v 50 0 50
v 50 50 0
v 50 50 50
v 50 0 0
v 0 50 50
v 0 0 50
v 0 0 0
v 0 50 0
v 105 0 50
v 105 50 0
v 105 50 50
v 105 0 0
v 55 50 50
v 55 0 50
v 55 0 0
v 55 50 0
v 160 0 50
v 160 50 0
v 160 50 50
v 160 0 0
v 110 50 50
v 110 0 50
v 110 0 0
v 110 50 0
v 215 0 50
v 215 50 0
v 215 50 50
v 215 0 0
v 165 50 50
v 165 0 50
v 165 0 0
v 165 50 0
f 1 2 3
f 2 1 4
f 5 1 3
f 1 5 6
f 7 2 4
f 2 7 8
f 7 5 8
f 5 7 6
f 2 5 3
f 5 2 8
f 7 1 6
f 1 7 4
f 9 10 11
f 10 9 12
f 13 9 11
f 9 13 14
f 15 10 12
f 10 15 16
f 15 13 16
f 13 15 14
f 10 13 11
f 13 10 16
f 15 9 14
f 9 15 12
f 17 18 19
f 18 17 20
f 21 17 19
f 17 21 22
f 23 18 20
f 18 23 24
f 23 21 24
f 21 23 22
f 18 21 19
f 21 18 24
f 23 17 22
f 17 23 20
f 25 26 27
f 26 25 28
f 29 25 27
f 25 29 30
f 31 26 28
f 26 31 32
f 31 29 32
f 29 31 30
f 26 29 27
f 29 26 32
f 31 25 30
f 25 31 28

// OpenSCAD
 images = ["white.png", "white_flopped.png", "black.png", "black_flopped.png"];

imageScale = 0.9; // Edit this to make the character larger or smaller.

imageSize = 50;

spacingBetweenCubes = (imageSize/10);

numRows = len(images);

e = 0.1;
 

imageImpressionDepth = 1;
imageImpressionScale = imageImpressionDepth/100; // Calculated from surface scaling range (0 to 100)
margin = (imageSize - (imageSize * imageScale))/2;
centerImageOnCube = [margin, margin, imageImpressionDepth-e];
//centerImageOnCube = [margin, margin, -e];
uncenterImage = [imageSize/2, imageSize/2, imageImpressionDepth/2];

for ( i = [0 : numRows-1])
{
    translate([((imageSize*i) + (spacingBetweenCubes*i)), 0, 0]) {
        if( true )
        {
            difference() {
                cube(imageSize);
                translate(centerImageOnCube)
                scale([imageScale, imageScale, imageImpressionScale])
                surface(file = images[i]);
            }
        }
    }
}

//module cubes (images, imageSize, imageScale, spacingBetweenCubes)
//{
//    imageImpressionDepth = 1;
//    imageImpressionScale = imageImpressionDepth/100; // Calculated from surface scaling range (0 to 100)
//    margin = (imageSize - (imageSize * imageScale))/2;
//    centerImageOnCube = [margin, margin, imageImpressionDepth-e];
//    //centerImageOnCube = [margin, margin, -e];
//    uncenterImage = [imageSize/2, imageSize/2, imageImpressionDepth/2];
//    
////    i = 0;
////    j=0;
////                    difference() {
////                       cube(imageSize);
////                       translate(centerImageOnCube)
////                        scale([imageScale, imageScale, imageImpressionScale])
////                            
////                            translate(uncenterImage)
////                        mirror([1,0,0])
////                                surface(file = characterImages[i][j], invert = true, center=true);
////
////                    }
//
//    for (i = [ 0 : numRows-1])
//    {
//        for (j = [ 0 : numCols-1])
//        {
//            translate([((imageSize*i) + (spacingBetweenCubes*i)),((imageSize*j) + (spacingBetweenCubes*j)),0]) {
//                difference() {
//                    cube(imageSize);
//                    translate(centerImageOnCube)
//                        scale([imageScale, imageScale, imageImpressionScale])
//                            translate(uncenterImage)
//                                mirror([1,0,0])
//                                    surface(file = characterImages[i][j], invert = true, center=true);
////                                    surface(file = characterImages[i][j], invert = false, center=false);
//                }
//            }
//        }
//    }
//}
